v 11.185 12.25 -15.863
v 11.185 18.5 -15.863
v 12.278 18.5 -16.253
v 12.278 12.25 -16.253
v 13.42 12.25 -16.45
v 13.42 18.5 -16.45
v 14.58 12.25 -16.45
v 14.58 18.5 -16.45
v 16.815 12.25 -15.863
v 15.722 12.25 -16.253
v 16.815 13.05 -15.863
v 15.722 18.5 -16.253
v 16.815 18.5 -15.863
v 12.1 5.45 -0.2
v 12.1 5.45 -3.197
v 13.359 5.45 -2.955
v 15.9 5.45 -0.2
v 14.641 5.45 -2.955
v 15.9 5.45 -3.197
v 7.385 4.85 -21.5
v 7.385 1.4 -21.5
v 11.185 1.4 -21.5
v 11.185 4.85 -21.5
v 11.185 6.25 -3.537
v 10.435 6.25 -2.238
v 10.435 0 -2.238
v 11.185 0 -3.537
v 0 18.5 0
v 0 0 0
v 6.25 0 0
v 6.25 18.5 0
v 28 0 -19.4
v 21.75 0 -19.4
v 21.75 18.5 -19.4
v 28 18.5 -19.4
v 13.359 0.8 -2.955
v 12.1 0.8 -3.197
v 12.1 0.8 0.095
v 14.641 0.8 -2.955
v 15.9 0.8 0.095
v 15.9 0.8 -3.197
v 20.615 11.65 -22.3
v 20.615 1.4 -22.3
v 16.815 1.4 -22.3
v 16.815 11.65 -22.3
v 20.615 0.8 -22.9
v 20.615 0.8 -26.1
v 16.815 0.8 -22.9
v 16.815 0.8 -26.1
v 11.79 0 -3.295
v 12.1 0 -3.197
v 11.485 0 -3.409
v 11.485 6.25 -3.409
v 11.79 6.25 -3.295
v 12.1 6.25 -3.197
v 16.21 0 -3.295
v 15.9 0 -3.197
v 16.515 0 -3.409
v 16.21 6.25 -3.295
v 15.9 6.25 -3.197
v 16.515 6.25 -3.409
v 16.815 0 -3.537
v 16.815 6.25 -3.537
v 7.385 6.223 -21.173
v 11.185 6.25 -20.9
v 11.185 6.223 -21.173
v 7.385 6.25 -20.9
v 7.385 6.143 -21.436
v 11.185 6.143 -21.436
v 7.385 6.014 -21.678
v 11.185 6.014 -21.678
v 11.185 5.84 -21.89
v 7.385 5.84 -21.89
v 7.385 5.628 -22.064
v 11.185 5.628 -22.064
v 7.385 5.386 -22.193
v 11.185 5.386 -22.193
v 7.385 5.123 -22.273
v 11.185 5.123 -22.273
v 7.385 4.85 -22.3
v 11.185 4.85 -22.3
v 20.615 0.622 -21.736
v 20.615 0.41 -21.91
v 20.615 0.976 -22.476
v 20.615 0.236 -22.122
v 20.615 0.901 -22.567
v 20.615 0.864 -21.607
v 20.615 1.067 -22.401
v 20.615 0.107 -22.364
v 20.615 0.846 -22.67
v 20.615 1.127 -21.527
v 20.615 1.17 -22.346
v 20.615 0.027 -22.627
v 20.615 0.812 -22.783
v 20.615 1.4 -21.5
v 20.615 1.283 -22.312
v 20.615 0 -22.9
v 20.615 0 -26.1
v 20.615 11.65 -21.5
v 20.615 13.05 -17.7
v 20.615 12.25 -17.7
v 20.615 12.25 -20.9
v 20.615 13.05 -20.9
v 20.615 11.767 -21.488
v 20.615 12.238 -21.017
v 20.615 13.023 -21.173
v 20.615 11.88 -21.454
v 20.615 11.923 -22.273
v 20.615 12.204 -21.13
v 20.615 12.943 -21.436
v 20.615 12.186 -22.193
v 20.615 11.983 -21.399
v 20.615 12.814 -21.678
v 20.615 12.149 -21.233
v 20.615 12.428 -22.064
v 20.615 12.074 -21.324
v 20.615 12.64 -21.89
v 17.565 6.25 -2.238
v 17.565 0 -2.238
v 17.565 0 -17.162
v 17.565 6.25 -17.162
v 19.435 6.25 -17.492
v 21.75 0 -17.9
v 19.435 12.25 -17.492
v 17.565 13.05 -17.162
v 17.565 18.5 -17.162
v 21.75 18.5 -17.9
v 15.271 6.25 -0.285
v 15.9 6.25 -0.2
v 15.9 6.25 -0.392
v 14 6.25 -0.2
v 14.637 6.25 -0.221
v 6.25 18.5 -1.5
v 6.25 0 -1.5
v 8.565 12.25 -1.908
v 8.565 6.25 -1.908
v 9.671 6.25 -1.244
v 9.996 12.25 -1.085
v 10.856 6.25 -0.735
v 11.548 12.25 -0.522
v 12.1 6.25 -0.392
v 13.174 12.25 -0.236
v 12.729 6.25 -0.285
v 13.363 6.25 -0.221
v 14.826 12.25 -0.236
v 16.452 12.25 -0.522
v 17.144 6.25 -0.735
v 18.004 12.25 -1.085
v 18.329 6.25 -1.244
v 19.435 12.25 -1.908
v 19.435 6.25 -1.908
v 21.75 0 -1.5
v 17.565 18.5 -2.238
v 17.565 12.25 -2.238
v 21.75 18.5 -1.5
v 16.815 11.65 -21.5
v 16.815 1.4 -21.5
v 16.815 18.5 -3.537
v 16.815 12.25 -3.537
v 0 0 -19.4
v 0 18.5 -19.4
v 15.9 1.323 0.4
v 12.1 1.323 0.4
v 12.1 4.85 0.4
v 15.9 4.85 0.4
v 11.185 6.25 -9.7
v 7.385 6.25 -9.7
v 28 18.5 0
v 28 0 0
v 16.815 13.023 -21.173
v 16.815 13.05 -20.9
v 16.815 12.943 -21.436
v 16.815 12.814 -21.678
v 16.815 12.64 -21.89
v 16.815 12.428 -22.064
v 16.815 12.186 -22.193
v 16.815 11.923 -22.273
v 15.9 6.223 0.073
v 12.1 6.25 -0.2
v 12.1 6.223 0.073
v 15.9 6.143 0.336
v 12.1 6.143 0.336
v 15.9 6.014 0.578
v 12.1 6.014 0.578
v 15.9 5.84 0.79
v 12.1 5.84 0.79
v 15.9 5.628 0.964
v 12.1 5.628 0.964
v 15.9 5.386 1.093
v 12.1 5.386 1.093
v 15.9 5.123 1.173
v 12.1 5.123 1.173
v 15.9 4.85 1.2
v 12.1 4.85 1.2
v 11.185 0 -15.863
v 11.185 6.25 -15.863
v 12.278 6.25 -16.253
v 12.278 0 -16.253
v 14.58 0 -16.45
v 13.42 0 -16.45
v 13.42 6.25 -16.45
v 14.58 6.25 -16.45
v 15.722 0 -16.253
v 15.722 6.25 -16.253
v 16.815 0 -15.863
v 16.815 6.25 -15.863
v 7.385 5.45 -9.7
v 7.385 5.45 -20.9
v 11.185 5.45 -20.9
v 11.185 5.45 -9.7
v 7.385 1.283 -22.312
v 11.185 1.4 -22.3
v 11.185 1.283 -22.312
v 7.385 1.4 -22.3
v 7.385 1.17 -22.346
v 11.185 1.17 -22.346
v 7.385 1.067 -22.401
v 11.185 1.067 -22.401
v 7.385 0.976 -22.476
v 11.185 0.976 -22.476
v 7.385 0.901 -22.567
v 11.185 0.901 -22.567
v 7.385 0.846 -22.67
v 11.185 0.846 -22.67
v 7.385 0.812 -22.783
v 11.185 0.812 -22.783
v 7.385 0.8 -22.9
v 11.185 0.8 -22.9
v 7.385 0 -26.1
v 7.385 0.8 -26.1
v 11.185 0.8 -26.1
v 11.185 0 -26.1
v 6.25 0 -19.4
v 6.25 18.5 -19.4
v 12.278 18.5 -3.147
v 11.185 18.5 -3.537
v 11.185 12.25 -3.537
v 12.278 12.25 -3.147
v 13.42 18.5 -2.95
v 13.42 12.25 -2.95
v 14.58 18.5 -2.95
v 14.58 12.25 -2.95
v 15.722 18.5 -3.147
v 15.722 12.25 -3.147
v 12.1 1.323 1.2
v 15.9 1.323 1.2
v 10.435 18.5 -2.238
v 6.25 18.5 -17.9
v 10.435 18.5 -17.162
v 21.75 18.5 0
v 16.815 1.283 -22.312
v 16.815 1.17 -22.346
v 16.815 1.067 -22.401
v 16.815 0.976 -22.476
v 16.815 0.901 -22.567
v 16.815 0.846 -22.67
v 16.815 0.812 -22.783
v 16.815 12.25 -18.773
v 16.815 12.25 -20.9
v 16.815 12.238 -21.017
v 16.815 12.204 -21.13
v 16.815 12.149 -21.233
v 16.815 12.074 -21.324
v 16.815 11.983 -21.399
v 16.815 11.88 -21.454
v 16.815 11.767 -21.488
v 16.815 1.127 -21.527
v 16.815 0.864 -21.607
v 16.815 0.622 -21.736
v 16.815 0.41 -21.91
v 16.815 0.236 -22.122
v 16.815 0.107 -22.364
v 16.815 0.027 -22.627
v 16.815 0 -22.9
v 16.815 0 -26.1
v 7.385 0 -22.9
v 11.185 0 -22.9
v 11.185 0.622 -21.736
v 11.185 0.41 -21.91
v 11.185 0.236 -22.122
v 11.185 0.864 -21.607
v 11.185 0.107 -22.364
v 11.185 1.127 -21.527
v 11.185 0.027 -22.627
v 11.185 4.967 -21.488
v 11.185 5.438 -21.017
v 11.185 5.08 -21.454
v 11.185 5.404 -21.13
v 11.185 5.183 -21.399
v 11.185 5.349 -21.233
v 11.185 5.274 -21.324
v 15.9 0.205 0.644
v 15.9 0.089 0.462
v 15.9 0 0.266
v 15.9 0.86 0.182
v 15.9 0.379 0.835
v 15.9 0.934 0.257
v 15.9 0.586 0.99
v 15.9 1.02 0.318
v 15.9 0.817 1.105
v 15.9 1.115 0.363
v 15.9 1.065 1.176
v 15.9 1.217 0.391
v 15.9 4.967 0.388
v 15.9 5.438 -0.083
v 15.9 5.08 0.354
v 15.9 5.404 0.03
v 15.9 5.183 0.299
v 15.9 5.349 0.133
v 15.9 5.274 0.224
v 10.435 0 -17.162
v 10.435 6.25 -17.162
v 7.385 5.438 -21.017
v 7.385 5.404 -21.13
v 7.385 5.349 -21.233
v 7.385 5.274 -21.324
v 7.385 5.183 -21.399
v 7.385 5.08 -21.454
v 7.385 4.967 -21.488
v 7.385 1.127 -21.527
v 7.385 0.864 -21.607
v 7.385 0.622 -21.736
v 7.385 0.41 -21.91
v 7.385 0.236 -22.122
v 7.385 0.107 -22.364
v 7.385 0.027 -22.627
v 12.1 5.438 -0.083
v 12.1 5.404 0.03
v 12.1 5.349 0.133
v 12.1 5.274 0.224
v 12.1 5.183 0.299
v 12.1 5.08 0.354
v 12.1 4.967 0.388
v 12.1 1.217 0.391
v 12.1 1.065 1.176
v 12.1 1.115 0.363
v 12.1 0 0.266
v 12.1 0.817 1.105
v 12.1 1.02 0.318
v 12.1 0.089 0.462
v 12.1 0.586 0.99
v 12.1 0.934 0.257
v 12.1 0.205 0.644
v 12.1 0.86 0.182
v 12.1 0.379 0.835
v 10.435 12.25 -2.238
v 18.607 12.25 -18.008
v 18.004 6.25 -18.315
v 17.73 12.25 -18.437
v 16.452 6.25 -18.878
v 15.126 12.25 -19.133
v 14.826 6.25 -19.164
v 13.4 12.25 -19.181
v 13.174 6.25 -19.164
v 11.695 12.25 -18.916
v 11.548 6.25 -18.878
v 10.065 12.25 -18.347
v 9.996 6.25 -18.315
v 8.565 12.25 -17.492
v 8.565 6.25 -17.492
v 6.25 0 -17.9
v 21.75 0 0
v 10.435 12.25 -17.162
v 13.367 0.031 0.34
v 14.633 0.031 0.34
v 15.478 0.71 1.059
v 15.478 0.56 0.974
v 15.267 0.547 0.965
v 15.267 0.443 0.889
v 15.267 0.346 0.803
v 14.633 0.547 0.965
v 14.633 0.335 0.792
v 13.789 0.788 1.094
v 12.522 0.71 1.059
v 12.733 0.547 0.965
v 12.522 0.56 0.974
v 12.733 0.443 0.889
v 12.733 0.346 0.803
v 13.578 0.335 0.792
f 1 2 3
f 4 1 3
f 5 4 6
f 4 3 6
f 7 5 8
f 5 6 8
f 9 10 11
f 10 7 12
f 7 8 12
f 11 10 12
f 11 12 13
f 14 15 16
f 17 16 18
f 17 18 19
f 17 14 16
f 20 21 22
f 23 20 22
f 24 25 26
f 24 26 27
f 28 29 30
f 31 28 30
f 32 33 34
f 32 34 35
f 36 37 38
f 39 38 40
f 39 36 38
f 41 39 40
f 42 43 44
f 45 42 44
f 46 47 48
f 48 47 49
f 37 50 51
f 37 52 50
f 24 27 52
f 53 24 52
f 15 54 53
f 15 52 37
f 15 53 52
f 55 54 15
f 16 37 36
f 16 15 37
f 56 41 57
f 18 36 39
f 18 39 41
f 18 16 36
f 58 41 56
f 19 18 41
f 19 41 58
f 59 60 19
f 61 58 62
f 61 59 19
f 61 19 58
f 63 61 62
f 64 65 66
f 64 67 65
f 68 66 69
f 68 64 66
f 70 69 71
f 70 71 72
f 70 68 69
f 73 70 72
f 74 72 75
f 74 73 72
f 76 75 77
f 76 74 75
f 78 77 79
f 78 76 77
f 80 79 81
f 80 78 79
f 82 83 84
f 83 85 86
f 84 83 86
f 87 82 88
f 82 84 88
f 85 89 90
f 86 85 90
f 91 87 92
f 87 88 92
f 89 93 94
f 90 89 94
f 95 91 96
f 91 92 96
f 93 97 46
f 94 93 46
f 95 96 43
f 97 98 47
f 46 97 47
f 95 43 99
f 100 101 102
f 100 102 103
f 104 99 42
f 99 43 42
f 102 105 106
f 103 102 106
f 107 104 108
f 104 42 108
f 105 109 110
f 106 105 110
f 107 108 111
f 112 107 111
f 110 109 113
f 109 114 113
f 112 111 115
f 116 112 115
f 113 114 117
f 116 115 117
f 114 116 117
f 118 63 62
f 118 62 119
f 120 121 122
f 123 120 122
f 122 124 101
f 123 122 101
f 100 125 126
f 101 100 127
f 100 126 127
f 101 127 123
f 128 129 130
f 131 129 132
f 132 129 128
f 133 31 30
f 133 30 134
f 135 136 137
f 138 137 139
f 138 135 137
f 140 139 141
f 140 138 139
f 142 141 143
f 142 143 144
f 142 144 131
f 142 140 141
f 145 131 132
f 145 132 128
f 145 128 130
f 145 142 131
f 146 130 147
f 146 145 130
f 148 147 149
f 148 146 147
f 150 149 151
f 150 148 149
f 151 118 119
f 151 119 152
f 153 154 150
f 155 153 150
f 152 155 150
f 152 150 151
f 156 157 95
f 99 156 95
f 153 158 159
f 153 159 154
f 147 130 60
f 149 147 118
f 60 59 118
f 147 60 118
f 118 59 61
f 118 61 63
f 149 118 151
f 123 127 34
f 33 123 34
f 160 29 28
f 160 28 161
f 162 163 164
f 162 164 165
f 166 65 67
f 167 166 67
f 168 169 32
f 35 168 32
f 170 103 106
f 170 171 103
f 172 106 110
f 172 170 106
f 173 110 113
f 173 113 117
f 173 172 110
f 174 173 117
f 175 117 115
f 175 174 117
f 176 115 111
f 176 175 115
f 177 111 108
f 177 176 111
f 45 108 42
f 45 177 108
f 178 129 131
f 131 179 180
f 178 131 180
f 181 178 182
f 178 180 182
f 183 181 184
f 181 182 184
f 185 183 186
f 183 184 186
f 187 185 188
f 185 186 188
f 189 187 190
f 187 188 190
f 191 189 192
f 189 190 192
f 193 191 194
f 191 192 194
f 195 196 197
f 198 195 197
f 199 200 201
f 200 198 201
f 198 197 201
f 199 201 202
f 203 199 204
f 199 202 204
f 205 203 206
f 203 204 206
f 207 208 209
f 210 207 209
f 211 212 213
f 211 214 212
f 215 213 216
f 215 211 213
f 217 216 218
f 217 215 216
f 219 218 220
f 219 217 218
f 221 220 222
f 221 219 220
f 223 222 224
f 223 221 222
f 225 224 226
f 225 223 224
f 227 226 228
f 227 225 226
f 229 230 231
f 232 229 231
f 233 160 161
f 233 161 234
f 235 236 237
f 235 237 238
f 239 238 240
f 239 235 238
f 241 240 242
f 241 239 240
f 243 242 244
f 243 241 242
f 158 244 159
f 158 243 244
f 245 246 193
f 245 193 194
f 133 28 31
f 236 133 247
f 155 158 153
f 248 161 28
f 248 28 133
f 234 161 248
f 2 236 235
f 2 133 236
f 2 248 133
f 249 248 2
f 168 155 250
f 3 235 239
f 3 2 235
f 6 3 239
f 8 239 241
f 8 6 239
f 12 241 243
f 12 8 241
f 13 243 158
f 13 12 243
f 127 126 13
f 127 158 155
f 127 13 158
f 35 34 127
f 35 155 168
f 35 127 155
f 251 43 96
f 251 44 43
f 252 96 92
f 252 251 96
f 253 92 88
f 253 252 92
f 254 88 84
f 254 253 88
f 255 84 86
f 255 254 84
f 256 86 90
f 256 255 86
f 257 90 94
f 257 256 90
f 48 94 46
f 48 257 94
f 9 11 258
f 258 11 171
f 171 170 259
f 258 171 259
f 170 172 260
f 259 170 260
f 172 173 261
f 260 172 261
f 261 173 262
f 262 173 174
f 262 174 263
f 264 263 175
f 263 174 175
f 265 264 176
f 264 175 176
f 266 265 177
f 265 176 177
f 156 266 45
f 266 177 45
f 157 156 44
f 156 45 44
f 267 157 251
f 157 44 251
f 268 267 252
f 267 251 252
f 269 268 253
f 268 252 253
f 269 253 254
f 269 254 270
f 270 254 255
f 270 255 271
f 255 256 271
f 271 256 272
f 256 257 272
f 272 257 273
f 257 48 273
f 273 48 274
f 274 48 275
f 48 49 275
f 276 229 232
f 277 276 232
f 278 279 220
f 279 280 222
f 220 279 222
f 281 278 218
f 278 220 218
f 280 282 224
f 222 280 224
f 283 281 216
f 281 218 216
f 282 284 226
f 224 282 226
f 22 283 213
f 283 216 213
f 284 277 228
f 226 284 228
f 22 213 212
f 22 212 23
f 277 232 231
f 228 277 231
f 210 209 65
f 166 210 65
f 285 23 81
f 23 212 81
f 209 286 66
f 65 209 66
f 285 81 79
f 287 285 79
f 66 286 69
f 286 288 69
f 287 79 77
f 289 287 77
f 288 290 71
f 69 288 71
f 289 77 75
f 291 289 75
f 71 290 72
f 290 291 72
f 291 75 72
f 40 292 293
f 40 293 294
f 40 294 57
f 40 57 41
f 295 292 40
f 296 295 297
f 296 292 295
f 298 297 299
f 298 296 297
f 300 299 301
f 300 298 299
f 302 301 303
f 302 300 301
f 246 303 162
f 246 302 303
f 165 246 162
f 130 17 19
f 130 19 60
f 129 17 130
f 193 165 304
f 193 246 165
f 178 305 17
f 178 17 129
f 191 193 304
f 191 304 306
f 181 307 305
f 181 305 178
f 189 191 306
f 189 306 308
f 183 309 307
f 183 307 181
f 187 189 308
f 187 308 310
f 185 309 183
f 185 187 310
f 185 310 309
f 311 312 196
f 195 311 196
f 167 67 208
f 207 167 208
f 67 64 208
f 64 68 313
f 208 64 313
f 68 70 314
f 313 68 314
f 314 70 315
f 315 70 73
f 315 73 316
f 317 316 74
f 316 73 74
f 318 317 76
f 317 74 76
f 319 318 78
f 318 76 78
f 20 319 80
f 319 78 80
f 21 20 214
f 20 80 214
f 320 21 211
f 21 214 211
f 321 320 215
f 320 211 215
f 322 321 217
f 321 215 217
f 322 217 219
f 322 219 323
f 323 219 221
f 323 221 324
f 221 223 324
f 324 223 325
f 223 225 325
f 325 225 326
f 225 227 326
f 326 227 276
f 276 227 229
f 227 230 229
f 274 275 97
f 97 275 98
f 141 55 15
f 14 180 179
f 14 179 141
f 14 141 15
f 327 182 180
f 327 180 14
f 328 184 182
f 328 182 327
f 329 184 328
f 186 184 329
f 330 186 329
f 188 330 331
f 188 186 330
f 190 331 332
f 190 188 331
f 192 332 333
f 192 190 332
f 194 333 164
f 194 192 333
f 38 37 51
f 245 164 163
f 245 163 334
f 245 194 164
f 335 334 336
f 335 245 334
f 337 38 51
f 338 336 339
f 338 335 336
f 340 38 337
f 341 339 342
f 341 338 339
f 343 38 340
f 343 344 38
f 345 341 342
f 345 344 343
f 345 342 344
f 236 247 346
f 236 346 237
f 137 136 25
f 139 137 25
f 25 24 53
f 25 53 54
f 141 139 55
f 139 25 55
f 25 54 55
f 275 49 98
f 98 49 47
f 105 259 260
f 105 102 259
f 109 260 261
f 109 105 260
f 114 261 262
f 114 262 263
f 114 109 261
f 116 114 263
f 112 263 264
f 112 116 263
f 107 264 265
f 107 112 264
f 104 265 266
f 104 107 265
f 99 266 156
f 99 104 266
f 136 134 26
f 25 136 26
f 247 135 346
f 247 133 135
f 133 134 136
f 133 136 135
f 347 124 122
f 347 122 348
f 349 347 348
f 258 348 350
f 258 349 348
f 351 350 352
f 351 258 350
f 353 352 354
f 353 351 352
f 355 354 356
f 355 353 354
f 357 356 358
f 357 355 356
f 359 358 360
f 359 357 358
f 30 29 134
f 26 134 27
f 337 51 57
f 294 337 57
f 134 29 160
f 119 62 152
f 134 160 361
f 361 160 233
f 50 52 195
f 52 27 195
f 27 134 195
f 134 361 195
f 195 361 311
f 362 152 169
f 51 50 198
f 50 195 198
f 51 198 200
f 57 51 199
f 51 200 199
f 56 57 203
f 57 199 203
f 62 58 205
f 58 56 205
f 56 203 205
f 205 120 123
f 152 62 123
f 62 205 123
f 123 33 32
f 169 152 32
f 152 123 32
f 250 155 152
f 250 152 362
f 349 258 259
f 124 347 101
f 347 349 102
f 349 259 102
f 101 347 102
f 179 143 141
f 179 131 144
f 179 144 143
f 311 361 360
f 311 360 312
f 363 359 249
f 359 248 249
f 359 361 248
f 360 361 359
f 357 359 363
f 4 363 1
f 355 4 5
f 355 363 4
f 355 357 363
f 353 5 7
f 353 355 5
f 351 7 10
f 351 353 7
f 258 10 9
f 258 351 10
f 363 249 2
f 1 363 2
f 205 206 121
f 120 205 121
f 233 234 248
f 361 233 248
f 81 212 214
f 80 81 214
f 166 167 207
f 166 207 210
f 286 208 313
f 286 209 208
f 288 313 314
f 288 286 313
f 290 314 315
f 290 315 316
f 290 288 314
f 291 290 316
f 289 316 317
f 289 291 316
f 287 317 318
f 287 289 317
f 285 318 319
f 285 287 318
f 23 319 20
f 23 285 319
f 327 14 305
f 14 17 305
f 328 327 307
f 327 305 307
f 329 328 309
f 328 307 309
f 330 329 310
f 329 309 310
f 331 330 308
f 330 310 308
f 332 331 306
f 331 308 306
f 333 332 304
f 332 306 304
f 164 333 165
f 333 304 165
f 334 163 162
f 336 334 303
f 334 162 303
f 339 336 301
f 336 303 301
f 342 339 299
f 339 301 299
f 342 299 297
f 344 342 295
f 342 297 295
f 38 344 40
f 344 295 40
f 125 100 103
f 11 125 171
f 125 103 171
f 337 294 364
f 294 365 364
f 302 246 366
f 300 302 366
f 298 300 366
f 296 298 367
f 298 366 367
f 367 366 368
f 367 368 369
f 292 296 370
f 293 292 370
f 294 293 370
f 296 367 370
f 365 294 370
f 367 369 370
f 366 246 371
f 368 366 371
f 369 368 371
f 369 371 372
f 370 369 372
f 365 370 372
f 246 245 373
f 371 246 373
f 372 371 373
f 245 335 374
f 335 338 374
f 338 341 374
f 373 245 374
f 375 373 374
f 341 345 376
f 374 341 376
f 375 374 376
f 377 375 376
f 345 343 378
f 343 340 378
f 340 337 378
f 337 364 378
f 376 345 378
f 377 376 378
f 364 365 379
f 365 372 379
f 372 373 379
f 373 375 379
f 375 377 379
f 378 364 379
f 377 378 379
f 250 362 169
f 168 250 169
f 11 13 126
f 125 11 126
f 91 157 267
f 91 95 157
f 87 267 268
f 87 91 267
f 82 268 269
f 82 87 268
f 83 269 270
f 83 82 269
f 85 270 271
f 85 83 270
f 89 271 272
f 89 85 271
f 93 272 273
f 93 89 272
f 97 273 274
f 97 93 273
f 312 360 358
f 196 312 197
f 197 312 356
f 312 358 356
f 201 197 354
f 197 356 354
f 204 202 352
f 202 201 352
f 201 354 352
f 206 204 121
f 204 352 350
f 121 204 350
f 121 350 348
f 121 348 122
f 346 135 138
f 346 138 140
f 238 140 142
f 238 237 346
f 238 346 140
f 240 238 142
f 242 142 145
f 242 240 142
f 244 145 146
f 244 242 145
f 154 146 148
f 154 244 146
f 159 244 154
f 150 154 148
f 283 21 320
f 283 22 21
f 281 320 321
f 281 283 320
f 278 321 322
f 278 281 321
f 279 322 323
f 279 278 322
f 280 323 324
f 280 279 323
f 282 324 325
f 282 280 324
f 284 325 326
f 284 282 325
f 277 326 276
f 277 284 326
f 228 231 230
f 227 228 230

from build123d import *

# Parameters (mm, degrees)
SKETCH1_W           = 28
SKETCH1_H           = 19.4
BOSS_EXTRUDE1_DEPTH = 18.5
CUT_EXTRUDE1_REACH  = 40.764
SKETCH3_R           = 9.5
BOSS_EXTRUDE2_DEPTH = 3
SKETCH4_W           = 3.8
SKETCH4_H           = 0.8
SKETCH7_W           = 3.8
SKETCH7_H           = 0.8
SKETCH9_W           = 3.8
SKETCH9_H           = 0.8


with BuildPart() as part:
    # Sketch1 → Boss-Extrude1 (new body)
    with BuildSketch(Plane(origin=(0, 0, 0), x_dir=(1, 0, 0), z_dir=(0, 1, 0))):
        with Locations((14, 9.7)):
            Rectangle(SKETCH1_W, SKETCH1_H)
    extrude(amount=BOSS_EXTRUDE1_DEPTH)

    # Sketch2 → Cut-Extrude1 (cut, up to next)
    with BuildSketch(Plane(origin=(0, 18.5, 0), x_dir=(1, 0, 0), z_dir=(0, 1, 0)), mode=Mode.PRIVATE) as cut_extrude1_sk1:
        with BuildLine():
            Line((21.75, 19.4), (6.25, 19.4))
            Line((6.25, 19.4), (6.25, 17.9))
            Line((6.25, 17.9), (10.43543295, 17.161995245))
            Line((10.43543295, 17.161995245), (11.18543295, 15.862957139))
            ThreePointArc((11.18543295, 15.862957139), (14, 16.475236407), (16.81456705, 15.862957139))
            Line((16.81456705, 15.862957139), (17.56456705, 17.161995245))
            Line((17.56456705, 17.161995245), (21.75, 17.9))
            Line((21.75, 17.9), (21.75, 19.4))
        make_face()
    cut_extrude1_tool1 = extrude(cut_extrude1_sk1.sketch, amount=-CUT_EXTRUDE1_REACH, mode=Mode.PRIVATE) & part.part
    cut_extrude1 = cut_extrude1_tool1.solids().sort_by_distance((14, 18.5, -18.102392))[0]
    add(cut_extrude1, mode=Mode.SUBTRACT)

    # Mirror1: Cut-Extrude1 across plane
    add(cut_extrude1.mirror(Plane.XY.offset(-9.7)), mode=Mode.SUBTRACT)

    # Sketch3 → Boss-Extrude2 (add, symmetric)
    with BuildSketch(Plane(origin=(0, 9.25, 0), x_dir=(1, 0, 0), z_dir=(0, 1, 0))):
        with Locations((14, 9.7)):
            Circle(SKETCH3_R)
    extrude(amount=BOSS_EXTRUDE2_DEPTH, both=True)

    # Sweep1: sweep along a path in Sketch6
    with BuildLine(Plane.ZY.offset(-18.71456705)) as sweep1_path:
        Line((-9.7, 12.65), (-20.9, 12.65))
        ThreePointArc((-20.9, 12.65), (-21.607106781, 12.357106781), (-21.9, 11.65))
        Line((-21.9, 11.65), (-21.9, 1.4))
        ThreePointArc((-21.9, 1.4), (-22.192893219, 0.692893219), (-22.9, 0.4))
        Line((-22.9, 0.4), (-26.1, 0.4))
    # Sketch4 → Sweep1 (sweep)
    with BuildSketch(Plane.XY.offset(-9.7)):
        with Locations((18.71456705, 12.65)):
            Rectangle(SKETCH4_W, SKETCH4_H)
    sweep(path=sweep1_path.line)

    # Sweep3: sweep along a path in Sketch12
    with BuildLine(Plane.ZY.offset(-14)) as sweep3_path:
        Line((-9.7, 5.85), (-0.2, 5.85))
        ThreePointArc((-0.2, 5.85), (0.507106781, 5.557106781), (0.8, 4.85))
        Line((0.8, 4.85), (0.8, 1.322538328))
        ThreePointArc((0.8, 1.322538328), (0.632437827, 0.768419871), (0.185905473, 0.4))
        Line((0.185905473, 0.4), (-9.7, 0.4))
    # Sketch9 → Sweep3 (sweep)
    with BuildSketch(Plane.XY.offset(-9.7)):
        with Locations((14, 5.85)):
            Rectangle(SKETCH9_W, SKETCH9_H)
    sweep(path=sweep3_path.line, transition=Transition.RIGHT)


with BuildPart() as body_2:
    # Sweep2: sweep along a path in Sketch8
    with BuildLine(Plane.ZY.offset(-9.28543295)) as sweep2_path:
        Line((-9.7, 5.85), (-20.9, 5.85))
        ThreePointArc((-20.9, 5.85), (-21.607106781, 5.557106781), (-21.9, 4.85))
        Line((-21.9, 4.85), (-21.9, 1.4))
        ThreePointArc((-21.9, 1.4), (-22.192893219, 0.692893219), (-22.9, 0.4))
        Line((-22.9, 0.4), (-26.1, 0.4))
    # Sketch7 → Sweep2 (sweep)
    with BuildSketch(Plane.XY.offset(-9.7)):
        with Locations((9.28543295, 5.85)):
            Rectangle(SKETCH7_W, SKETCH7_H)
    sweep(path=sweep2_path.line)


solid = Compound([part.part, body_2.part])
